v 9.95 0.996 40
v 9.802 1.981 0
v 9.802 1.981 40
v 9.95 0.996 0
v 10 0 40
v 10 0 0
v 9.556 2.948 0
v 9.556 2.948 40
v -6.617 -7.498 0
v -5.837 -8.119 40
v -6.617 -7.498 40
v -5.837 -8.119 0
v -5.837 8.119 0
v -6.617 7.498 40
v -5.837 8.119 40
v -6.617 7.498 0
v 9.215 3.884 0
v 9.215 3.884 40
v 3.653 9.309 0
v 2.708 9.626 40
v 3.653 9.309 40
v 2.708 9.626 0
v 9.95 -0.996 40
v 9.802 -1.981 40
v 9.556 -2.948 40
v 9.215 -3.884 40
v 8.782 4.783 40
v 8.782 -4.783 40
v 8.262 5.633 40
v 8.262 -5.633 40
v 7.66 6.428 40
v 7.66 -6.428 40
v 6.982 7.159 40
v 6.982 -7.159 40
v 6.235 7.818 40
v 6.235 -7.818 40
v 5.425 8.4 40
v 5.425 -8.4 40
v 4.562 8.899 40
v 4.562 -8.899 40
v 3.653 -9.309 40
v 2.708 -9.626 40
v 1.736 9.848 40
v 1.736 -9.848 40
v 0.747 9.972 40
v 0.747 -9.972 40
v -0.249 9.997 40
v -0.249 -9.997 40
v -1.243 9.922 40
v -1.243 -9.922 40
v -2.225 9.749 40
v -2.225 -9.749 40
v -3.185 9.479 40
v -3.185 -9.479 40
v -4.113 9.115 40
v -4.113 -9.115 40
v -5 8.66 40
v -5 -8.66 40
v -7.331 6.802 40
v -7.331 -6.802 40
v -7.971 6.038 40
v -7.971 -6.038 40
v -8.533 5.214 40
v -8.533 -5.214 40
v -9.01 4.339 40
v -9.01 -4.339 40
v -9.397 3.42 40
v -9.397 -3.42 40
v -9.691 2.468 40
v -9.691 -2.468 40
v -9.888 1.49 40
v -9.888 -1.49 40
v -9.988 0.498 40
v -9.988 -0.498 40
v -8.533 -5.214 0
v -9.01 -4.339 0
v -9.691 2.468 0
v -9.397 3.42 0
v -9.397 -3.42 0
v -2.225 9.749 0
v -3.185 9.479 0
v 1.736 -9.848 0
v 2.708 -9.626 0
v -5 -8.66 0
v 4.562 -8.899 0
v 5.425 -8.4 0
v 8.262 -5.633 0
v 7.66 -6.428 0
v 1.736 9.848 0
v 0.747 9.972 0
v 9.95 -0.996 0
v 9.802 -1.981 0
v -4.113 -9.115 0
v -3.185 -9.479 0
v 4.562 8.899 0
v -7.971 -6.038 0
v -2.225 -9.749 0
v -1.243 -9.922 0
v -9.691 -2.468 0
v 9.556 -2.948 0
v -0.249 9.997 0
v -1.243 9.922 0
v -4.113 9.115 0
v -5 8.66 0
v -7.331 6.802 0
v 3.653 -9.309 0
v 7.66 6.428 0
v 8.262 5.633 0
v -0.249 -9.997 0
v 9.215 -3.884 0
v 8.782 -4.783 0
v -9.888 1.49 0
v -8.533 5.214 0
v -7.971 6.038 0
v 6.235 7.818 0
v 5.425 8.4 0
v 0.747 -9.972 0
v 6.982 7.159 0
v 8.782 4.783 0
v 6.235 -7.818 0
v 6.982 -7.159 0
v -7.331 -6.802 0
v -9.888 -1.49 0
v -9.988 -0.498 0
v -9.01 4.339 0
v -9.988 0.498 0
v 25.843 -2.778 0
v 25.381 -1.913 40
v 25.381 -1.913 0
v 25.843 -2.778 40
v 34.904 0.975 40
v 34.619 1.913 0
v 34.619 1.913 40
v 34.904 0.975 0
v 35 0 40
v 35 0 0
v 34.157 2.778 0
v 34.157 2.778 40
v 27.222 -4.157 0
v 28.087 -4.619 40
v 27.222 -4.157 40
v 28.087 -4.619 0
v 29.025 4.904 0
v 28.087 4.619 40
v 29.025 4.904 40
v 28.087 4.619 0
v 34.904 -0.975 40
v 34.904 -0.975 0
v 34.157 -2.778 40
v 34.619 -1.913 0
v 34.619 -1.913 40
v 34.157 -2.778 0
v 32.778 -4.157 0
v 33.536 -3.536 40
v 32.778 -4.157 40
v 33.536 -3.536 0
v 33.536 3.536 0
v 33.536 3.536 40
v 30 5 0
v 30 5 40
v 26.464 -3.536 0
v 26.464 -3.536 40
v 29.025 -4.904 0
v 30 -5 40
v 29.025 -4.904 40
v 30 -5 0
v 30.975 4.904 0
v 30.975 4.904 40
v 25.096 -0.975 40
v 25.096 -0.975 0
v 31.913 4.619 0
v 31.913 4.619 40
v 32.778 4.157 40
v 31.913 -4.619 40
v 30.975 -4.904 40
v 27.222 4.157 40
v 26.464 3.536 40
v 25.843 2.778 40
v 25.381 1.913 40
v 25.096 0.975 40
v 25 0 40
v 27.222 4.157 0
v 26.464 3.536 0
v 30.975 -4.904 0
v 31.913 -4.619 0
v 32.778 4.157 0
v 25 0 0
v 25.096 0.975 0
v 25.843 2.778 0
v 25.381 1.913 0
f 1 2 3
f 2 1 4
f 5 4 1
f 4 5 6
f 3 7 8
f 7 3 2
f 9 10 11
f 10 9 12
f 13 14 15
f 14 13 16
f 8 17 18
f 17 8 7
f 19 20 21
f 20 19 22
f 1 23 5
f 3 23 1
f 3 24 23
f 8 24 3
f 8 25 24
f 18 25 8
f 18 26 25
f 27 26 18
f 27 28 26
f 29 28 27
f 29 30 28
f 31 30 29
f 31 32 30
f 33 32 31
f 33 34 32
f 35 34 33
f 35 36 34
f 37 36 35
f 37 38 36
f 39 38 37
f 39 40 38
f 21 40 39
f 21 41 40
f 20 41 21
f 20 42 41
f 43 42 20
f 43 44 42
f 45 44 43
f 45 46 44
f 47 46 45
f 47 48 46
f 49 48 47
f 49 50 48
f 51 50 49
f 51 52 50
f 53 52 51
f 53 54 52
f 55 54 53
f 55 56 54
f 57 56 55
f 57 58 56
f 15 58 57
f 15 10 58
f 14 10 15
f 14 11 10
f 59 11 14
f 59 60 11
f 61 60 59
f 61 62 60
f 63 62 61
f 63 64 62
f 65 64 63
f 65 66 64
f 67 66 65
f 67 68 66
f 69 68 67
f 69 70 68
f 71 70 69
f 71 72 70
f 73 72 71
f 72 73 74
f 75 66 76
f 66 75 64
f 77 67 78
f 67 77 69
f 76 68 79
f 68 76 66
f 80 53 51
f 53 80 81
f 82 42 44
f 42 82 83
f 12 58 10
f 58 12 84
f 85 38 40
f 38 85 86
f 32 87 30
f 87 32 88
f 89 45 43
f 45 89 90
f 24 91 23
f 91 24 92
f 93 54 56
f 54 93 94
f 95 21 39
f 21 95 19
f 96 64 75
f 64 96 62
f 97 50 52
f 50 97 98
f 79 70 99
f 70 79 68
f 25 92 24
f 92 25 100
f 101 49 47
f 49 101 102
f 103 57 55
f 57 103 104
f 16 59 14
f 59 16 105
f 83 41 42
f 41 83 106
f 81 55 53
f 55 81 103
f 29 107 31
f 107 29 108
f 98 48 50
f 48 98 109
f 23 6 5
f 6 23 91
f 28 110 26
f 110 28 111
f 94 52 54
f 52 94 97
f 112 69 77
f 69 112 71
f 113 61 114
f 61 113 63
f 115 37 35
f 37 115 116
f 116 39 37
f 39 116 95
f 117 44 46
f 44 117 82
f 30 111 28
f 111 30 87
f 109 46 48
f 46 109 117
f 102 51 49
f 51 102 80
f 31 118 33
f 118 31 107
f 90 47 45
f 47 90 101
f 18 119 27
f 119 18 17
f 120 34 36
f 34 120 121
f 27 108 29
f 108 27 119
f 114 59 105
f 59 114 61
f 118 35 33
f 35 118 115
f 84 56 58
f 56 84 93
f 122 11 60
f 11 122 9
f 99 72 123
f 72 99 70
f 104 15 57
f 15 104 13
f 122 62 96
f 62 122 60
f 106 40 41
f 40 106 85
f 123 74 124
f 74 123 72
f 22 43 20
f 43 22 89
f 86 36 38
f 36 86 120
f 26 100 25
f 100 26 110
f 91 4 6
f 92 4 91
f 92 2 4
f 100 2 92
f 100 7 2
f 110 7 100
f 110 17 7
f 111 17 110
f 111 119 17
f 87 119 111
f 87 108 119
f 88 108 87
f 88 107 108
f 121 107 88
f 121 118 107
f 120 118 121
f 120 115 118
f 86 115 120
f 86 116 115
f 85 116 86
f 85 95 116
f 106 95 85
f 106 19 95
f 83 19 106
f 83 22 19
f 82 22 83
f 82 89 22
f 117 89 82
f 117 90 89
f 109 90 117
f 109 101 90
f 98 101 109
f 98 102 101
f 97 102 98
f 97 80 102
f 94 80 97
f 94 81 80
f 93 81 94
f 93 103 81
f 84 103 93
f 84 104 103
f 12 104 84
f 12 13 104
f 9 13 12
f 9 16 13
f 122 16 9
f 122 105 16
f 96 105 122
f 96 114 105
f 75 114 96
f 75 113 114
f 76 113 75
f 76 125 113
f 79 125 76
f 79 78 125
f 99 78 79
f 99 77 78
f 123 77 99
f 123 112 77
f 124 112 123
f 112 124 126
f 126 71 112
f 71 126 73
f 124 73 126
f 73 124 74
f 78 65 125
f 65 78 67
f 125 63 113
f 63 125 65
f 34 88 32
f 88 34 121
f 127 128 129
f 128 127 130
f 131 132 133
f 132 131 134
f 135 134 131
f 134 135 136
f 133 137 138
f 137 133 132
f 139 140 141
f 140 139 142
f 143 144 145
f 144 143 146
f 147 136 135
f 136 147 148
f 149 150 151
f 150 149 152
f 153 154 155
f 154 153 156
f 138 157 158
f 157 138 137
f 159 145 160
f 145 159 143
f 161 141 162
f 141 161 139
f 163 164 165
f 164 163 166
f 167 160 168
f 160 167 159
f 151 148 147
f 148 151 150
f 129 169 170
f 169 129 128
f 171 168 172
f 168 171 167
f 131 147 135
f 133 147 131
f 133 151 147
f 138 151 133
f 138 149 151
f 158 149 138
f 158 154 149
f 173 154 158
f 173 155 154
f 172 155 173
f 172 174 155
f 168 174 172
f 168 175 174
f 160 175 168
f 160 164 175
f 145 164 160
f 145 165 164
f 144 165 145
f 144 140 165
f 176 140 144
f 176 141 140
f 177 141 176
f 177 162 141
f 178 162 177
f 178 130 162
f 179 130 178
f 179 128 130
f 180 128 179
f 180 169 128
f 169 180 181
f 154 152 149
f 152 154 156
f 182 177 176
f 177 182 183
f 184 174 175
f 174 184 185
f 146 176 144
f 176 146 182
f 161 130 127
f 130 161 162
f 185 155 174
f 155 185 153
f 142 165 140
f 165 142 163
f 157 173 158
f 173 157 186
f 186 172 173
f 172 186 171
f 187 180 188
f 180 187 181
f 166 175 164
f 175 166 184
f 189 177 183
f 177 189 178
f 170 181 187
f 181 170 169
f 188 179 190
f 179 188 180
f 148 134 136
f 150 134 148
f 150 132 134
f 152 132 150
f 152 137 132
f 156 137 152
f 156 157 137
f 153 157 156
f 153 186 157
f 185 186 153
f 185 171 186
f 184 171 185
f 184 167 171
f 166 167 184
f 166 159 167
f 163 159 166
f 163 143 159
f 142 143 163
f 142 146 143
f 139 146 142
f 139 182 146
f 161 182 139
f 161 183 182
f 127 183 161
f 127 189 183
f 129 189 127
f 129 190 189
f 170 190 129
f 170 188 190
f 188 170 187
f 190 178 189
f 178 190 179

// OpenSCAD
$fs=1;
$fa=0.1;
cylinder(r=10,h=40);
translate([30,0,0])cylinder(r=5,h=40);

//screen capture settings
$vpr=[70,0,25];
$vpd=140;
$vpt=[8,15,16];
